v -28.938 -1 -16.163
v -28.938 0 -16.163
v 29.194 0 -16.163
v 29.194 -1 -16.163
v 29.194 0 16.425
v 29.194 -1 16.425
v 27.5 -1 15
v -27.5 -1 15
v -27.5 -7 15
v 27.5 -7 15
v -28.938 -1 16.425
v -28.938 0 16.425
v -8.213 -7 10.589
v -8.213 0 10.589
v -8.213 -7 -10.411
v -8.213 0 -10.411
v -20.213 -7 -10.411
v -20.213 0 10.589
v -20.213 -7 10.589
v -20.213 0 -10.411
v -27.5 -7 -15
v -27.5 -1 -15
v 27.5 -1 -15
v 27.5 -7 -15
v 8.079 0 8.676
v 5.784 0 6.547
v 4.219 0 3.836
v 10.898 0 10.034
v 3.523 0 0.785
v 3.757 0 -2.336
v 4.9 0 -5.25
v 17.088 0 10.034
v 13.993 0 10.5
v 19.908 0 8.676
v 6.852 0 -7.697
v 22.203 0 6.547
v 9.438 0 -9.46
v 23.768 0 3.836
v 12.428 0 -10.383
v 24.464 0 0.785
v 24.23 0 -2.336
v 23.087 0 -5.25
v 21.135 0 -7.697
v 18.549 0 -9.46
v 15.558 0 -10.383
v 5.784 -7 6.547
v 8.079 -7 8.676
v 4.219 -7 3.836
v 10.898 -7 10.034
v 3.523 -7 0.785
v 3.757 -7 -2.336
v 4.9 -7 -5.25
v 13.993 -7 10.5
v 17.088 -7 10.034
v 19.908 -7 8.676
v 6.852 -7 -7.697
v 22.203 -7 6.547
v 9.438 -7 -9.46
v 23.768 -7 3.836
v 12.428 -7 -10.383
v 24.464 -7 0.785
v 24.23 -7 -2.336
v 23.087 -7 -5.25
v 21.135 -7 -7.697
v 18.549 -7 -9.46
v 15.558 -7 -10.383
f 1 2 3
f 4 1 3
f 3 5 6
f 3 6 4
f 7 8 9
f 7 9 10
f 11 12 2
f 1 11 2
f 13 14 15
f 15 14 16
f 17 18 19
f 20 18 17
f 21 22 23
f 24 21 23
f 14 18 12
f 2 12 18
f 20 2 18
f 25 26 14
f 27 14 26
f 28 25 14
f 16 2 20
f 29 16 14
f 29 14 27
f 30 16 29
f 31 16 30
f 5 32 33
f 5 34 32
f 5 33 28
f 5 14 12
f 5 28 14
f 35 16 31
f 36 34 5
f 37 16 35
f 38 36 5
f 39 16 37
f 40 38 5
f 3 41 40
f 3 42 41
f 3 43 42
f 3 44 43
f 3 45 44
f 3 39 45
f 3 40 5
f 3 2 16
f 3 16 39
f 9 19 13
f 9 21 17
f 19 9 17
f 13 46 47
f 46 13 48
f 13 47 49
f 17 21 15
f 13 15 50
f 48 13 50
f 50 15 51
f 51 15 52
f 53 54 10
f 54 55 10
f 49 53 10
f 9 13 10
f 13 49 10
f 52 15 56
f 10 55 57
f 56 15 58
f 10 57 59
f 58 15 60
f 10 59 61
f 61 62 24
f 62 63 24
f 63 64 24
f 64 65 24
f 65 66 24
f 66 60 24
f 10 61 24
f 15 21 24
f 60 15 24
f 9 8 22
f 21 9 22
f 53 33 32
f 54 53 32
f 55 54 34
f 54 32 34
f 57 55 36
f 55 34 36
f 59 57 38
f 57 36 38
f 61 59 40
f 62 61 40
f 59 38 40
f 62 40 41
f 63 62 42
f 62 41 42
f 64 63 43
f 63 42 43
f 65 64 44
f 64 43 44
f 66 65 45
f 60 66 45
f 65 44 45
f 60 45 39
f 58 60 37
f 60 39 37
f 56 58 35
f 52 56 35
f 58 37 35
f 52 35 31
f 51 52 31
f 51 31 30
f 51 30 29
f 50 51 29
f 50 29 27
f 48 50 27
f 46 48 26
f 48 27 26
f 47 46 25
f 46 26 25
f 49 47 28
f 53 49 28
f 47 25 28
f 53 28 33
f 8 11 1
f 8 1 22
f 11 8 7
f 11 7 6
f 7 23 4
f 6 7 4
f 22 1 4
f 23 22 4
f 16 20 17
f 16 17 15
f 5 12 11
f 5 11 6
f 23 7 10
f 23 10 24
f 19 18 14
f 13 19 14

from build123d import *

# Parameters (mm, degrees)
SKETCH1_W           = 55
SKETCH1_H           = 30
SKETCH1_W_2         = 12
SKETCH1_H_2         = 21
SKETCH1_R           = 10.5
BOSS_EXTRUDE1_DEPTH = 7
SKETCH1_3_W         = 58.132008701
SKETCH1_3_H         = 32.587347793
SKETCH1_3_W_2       = 55
SKETCH1_3_H_2       = 30
BOSS_EXTRUDE2_DEPTH = 1


with BuildPart() as part:
    # Sketch1 → Boss-Extrude1 (new body)
    with BuildSketch(Plane(origin=(0, 0, 0), x_dir=(1, 0, 0), z_dir=(0, 1, 0))):
        Rectangle(SKETCH1_W, SKETCH1_H)
        with Locations((-14.212711625, -0.088861689)):
            Rectangle(SKETCH1_W_2, SKETCH1_H_2, mode=Mode.SUBTRACT)
        with Locations((13.99341574, 0)):
            Circle(SKETCH1_R, mode=Mode.SUBTRACT)
    extrude(amount=-BOSS_EXTRUDE1_DEPTH)

    # Sketch1<3> → Boss-Extrude2 (add)
    with BuildSketch(Plane(origin=(0, 0, 0), x_dir=(1, 0, 0), z_dir=(0, 1, 0))):
        with Locations((0.128352579, -0.130903876)):
            Rectangle(SKETCH1_3_W, SKETCH1_3_H)
        Rectangle(SKETCH1_3_W_2, SKETCH1_3_H_2, mode=Mode.SUBTRACT)
    extrude(amount=-BOSS_EXTRUDE2_DEPTH)


solid = part.part
